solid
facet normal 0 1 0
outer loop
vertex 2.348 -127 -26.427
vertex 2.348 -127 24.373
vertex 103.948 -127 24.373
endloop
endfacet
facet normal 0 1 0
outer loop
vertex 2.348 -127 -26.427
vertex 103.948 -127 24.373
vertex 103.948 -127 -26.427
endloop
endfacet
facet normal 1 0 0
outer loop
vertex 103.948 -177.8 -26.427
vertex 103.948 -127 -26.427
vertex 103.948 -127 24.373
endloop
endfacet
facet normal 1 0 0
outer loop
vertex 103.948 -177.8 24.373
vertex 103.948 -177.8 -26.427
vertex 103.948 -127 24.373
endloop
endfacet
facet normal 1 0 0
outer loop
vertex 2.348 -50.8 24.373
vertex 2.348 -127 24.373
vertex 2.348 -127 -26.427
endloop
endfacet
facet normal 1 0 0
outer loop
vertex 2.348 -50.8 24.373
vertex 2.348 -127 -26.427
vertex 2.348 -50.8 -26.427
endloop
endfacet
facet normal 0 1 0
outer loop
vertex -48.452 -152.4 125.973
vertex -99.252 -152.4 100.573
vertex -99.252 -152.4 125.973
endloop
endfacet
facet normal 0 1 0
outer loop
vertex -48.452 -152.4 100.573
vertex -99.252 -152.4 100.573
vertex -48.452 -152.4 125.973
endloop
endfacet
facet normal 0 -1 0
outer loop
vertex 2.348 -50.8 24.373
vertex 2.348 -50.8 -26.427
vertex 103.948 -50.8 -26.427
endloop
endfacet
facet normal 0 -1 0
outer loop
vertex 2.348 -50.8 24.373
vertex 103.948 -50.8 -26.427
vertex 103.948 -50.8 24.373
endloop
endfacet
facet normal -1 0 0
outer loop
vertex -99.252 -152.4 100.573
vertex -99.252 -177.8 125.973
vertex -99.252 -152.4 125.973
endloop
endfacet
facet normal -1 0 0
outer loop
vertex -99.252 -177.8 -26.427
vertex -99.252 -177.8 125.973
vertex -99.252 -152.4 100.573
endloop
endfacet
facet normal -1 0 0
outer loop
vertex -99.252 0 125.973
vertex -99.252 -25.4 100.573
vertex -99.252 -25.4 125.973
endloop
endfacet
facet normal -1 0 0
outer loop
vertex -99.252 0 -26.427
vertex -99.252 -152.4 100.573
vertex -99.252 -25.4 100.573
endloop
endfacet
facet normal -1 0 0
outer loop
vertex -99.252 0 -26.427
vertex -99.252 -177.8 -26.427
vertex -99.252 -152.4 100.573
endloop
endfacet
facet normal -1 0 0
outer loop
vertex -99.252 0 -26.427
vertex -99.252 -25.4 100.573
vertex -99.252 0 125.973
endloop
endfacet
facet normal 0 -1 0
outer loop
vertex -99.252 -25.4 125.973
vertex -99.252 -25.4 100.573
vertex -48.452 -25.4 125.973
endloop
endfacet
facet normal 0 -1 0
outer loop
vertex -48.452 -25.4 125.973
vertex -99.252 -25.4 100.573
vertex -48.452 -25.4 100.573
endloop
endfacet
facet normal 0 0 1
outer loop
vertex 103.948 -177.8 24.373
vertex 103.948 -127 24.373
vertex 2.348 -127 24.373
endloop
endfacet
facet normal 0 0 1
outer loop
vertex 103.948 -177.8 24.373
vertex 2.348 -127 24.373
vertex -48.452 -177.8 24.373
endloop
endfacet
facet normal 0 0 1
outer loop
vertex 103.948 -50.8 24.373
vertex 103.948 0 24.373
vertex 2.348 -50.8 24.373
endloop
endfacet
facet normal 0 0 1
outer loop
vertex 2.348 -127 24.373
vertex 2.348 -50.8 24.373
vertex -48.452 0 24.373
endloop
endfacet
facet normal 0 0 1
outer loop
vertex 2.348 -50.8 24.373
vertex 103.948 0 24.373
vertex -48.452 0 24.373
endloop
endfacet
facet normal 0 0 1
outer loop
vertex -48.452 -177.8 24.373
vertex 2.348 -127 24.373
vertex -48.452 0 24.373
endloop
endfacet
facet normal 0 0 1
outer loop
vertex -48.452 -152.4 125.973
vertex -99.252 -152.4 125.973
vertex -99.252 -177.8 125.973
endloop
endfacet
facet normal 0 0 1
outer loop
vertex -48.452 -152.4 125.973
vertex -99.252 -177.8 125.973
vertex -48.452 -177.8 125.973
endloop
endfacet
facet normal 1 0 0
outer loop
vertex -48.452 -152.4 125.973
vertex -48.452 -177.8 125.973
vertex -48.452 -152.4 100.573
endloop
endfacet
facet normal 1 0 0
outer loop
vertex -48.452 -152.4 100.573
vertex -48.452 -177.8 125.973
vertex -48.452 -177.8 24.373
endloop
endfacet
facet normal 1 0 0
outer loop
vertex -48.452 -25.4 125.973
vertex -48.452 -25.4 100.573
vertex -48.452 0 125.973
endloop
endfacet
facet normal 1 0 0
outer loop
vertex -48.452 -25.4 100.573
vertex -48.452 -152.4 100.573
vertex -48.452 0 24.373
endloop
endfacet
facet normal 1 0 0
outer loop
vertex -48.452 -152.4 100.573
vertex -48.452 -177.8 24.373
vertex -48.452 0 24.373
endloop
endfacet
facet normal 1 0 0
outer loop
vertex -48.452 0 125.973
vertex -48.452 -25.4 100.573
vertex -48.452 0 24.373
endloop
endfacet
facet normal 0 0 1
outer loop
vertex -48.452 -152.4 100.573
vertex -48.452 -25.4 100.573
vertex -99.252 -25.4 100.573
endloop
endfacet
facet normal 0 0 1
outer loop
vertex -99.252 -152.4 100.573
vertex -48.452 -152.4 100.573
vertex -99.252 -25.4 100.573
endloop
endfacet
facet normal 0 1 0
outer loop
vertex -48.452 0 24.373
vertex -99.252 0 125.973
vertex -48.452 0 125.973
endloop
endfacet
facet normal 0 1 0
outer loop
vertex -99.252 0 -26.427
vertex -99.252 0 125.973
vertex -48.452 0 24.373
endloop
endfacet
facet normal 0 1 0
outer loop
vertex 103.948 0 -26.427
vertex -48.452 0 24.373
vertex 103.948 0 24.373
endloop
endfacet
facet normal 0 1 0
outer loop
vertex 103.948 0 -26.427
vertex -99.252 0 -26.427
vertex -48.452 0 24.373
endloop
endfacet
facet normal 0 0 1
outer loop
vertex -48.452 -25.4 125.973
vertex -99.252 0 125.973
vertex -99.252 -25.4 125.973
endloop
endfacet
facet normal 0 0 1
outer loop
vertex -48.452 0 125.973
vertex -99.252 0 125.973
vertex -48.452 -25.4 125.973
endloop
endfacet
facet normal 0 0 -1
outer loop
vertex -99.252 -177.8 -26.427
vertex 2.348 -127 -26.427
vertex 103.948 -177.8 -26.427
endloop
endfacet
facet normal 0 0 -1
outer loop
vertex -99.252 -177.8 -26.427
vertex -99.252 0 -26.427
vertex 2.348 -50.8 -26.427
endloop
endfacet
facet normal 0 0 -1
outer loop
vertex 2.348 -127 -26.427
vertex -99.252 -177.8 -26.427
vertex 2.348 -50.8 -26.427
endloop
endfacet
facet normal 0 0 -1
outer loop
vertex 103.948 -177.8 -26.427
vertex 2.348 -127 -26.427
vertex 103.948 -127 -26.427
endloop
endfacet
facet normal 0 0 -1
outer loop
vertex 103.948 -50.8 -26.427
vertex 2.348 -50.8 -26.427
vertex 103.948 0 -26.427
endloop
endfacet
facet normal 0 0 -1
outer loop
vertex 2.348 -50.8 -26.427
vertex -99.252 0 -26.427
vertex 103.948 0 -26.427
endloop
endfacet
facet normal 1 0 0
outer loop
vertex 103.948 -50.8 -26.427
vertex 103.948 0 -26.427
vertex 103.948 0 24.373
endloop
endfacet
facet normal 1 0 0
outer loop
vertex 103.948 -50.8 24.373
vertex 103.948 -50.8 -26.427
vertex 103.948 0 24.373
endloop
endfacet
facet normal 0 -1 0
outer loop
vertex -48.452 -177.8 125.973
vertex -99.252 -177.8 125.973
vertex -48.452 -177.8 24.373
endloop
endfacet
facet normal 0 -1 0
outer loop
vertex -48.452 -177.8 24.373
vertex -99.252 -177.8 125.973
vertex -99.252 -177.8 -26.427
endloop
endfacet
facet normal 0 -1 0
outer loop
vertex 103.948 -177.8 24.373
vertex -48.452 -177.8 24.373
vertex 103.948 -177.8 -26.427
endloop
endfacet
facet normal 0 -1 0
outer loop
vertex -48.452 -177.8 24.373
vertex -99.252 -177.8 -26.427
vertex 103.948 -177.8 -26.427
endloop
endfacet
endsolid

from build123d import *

# Parameters (mm, degrees)
F1_DEPTH = 177.8
F2_W     = 50.8
F2_H     = 25.4
F3_DEPTH = 25.4
F4_W     = 50.8
F4_H     = 25.4
F5_DEPTH = 25.4
F7_DEPTH = 101.6


with BuildPart() as f1:
    # F0 (on Front) → F1 (new body)
    with BuildSketch(Plane.XZ):
        Polygon((-99.25165, 100.57334), (-99.25165, -26.42666), (103.94835, -26.42666), (103.94835, 24.37334), (-48.45165, 24.37334), (-48.45165, 100.57334), align=None)
    extrude(amount=F1_DEPTH)

    # F2 (on face) → F3 (join)
    with BuildSketch(Plane.XY.offset(100.57334)):
        with Locations((-73.85165, -165.1)):
            Rectangle(F2_W, F2_H)
    extrude(amount=F3_DEPTH)

    # F4 (on face) → F5 (join)
    with BuildSketch(Plane.XY.offset(100.57334)):
        with Locations((-73.85165, -12.7)):
            Rectangle(F4_W, F4_H)
    extrude(amount=F5_DEPTH)

    # F6 (on face) → F7 (cut)
    with BuildSketch(Plane.YZ.offset(103.94835)):
        Polygon((-127, 24.37334), (-127, -1.02666), (-127, -26.42666), (-50.8, -26.42666), (-50.8, 0), (-50.8, 24.37334), align=None)
    extrude(amount=-F7_DEPTH, mode=Mode.SUBTRACT)


solid = f1.part
